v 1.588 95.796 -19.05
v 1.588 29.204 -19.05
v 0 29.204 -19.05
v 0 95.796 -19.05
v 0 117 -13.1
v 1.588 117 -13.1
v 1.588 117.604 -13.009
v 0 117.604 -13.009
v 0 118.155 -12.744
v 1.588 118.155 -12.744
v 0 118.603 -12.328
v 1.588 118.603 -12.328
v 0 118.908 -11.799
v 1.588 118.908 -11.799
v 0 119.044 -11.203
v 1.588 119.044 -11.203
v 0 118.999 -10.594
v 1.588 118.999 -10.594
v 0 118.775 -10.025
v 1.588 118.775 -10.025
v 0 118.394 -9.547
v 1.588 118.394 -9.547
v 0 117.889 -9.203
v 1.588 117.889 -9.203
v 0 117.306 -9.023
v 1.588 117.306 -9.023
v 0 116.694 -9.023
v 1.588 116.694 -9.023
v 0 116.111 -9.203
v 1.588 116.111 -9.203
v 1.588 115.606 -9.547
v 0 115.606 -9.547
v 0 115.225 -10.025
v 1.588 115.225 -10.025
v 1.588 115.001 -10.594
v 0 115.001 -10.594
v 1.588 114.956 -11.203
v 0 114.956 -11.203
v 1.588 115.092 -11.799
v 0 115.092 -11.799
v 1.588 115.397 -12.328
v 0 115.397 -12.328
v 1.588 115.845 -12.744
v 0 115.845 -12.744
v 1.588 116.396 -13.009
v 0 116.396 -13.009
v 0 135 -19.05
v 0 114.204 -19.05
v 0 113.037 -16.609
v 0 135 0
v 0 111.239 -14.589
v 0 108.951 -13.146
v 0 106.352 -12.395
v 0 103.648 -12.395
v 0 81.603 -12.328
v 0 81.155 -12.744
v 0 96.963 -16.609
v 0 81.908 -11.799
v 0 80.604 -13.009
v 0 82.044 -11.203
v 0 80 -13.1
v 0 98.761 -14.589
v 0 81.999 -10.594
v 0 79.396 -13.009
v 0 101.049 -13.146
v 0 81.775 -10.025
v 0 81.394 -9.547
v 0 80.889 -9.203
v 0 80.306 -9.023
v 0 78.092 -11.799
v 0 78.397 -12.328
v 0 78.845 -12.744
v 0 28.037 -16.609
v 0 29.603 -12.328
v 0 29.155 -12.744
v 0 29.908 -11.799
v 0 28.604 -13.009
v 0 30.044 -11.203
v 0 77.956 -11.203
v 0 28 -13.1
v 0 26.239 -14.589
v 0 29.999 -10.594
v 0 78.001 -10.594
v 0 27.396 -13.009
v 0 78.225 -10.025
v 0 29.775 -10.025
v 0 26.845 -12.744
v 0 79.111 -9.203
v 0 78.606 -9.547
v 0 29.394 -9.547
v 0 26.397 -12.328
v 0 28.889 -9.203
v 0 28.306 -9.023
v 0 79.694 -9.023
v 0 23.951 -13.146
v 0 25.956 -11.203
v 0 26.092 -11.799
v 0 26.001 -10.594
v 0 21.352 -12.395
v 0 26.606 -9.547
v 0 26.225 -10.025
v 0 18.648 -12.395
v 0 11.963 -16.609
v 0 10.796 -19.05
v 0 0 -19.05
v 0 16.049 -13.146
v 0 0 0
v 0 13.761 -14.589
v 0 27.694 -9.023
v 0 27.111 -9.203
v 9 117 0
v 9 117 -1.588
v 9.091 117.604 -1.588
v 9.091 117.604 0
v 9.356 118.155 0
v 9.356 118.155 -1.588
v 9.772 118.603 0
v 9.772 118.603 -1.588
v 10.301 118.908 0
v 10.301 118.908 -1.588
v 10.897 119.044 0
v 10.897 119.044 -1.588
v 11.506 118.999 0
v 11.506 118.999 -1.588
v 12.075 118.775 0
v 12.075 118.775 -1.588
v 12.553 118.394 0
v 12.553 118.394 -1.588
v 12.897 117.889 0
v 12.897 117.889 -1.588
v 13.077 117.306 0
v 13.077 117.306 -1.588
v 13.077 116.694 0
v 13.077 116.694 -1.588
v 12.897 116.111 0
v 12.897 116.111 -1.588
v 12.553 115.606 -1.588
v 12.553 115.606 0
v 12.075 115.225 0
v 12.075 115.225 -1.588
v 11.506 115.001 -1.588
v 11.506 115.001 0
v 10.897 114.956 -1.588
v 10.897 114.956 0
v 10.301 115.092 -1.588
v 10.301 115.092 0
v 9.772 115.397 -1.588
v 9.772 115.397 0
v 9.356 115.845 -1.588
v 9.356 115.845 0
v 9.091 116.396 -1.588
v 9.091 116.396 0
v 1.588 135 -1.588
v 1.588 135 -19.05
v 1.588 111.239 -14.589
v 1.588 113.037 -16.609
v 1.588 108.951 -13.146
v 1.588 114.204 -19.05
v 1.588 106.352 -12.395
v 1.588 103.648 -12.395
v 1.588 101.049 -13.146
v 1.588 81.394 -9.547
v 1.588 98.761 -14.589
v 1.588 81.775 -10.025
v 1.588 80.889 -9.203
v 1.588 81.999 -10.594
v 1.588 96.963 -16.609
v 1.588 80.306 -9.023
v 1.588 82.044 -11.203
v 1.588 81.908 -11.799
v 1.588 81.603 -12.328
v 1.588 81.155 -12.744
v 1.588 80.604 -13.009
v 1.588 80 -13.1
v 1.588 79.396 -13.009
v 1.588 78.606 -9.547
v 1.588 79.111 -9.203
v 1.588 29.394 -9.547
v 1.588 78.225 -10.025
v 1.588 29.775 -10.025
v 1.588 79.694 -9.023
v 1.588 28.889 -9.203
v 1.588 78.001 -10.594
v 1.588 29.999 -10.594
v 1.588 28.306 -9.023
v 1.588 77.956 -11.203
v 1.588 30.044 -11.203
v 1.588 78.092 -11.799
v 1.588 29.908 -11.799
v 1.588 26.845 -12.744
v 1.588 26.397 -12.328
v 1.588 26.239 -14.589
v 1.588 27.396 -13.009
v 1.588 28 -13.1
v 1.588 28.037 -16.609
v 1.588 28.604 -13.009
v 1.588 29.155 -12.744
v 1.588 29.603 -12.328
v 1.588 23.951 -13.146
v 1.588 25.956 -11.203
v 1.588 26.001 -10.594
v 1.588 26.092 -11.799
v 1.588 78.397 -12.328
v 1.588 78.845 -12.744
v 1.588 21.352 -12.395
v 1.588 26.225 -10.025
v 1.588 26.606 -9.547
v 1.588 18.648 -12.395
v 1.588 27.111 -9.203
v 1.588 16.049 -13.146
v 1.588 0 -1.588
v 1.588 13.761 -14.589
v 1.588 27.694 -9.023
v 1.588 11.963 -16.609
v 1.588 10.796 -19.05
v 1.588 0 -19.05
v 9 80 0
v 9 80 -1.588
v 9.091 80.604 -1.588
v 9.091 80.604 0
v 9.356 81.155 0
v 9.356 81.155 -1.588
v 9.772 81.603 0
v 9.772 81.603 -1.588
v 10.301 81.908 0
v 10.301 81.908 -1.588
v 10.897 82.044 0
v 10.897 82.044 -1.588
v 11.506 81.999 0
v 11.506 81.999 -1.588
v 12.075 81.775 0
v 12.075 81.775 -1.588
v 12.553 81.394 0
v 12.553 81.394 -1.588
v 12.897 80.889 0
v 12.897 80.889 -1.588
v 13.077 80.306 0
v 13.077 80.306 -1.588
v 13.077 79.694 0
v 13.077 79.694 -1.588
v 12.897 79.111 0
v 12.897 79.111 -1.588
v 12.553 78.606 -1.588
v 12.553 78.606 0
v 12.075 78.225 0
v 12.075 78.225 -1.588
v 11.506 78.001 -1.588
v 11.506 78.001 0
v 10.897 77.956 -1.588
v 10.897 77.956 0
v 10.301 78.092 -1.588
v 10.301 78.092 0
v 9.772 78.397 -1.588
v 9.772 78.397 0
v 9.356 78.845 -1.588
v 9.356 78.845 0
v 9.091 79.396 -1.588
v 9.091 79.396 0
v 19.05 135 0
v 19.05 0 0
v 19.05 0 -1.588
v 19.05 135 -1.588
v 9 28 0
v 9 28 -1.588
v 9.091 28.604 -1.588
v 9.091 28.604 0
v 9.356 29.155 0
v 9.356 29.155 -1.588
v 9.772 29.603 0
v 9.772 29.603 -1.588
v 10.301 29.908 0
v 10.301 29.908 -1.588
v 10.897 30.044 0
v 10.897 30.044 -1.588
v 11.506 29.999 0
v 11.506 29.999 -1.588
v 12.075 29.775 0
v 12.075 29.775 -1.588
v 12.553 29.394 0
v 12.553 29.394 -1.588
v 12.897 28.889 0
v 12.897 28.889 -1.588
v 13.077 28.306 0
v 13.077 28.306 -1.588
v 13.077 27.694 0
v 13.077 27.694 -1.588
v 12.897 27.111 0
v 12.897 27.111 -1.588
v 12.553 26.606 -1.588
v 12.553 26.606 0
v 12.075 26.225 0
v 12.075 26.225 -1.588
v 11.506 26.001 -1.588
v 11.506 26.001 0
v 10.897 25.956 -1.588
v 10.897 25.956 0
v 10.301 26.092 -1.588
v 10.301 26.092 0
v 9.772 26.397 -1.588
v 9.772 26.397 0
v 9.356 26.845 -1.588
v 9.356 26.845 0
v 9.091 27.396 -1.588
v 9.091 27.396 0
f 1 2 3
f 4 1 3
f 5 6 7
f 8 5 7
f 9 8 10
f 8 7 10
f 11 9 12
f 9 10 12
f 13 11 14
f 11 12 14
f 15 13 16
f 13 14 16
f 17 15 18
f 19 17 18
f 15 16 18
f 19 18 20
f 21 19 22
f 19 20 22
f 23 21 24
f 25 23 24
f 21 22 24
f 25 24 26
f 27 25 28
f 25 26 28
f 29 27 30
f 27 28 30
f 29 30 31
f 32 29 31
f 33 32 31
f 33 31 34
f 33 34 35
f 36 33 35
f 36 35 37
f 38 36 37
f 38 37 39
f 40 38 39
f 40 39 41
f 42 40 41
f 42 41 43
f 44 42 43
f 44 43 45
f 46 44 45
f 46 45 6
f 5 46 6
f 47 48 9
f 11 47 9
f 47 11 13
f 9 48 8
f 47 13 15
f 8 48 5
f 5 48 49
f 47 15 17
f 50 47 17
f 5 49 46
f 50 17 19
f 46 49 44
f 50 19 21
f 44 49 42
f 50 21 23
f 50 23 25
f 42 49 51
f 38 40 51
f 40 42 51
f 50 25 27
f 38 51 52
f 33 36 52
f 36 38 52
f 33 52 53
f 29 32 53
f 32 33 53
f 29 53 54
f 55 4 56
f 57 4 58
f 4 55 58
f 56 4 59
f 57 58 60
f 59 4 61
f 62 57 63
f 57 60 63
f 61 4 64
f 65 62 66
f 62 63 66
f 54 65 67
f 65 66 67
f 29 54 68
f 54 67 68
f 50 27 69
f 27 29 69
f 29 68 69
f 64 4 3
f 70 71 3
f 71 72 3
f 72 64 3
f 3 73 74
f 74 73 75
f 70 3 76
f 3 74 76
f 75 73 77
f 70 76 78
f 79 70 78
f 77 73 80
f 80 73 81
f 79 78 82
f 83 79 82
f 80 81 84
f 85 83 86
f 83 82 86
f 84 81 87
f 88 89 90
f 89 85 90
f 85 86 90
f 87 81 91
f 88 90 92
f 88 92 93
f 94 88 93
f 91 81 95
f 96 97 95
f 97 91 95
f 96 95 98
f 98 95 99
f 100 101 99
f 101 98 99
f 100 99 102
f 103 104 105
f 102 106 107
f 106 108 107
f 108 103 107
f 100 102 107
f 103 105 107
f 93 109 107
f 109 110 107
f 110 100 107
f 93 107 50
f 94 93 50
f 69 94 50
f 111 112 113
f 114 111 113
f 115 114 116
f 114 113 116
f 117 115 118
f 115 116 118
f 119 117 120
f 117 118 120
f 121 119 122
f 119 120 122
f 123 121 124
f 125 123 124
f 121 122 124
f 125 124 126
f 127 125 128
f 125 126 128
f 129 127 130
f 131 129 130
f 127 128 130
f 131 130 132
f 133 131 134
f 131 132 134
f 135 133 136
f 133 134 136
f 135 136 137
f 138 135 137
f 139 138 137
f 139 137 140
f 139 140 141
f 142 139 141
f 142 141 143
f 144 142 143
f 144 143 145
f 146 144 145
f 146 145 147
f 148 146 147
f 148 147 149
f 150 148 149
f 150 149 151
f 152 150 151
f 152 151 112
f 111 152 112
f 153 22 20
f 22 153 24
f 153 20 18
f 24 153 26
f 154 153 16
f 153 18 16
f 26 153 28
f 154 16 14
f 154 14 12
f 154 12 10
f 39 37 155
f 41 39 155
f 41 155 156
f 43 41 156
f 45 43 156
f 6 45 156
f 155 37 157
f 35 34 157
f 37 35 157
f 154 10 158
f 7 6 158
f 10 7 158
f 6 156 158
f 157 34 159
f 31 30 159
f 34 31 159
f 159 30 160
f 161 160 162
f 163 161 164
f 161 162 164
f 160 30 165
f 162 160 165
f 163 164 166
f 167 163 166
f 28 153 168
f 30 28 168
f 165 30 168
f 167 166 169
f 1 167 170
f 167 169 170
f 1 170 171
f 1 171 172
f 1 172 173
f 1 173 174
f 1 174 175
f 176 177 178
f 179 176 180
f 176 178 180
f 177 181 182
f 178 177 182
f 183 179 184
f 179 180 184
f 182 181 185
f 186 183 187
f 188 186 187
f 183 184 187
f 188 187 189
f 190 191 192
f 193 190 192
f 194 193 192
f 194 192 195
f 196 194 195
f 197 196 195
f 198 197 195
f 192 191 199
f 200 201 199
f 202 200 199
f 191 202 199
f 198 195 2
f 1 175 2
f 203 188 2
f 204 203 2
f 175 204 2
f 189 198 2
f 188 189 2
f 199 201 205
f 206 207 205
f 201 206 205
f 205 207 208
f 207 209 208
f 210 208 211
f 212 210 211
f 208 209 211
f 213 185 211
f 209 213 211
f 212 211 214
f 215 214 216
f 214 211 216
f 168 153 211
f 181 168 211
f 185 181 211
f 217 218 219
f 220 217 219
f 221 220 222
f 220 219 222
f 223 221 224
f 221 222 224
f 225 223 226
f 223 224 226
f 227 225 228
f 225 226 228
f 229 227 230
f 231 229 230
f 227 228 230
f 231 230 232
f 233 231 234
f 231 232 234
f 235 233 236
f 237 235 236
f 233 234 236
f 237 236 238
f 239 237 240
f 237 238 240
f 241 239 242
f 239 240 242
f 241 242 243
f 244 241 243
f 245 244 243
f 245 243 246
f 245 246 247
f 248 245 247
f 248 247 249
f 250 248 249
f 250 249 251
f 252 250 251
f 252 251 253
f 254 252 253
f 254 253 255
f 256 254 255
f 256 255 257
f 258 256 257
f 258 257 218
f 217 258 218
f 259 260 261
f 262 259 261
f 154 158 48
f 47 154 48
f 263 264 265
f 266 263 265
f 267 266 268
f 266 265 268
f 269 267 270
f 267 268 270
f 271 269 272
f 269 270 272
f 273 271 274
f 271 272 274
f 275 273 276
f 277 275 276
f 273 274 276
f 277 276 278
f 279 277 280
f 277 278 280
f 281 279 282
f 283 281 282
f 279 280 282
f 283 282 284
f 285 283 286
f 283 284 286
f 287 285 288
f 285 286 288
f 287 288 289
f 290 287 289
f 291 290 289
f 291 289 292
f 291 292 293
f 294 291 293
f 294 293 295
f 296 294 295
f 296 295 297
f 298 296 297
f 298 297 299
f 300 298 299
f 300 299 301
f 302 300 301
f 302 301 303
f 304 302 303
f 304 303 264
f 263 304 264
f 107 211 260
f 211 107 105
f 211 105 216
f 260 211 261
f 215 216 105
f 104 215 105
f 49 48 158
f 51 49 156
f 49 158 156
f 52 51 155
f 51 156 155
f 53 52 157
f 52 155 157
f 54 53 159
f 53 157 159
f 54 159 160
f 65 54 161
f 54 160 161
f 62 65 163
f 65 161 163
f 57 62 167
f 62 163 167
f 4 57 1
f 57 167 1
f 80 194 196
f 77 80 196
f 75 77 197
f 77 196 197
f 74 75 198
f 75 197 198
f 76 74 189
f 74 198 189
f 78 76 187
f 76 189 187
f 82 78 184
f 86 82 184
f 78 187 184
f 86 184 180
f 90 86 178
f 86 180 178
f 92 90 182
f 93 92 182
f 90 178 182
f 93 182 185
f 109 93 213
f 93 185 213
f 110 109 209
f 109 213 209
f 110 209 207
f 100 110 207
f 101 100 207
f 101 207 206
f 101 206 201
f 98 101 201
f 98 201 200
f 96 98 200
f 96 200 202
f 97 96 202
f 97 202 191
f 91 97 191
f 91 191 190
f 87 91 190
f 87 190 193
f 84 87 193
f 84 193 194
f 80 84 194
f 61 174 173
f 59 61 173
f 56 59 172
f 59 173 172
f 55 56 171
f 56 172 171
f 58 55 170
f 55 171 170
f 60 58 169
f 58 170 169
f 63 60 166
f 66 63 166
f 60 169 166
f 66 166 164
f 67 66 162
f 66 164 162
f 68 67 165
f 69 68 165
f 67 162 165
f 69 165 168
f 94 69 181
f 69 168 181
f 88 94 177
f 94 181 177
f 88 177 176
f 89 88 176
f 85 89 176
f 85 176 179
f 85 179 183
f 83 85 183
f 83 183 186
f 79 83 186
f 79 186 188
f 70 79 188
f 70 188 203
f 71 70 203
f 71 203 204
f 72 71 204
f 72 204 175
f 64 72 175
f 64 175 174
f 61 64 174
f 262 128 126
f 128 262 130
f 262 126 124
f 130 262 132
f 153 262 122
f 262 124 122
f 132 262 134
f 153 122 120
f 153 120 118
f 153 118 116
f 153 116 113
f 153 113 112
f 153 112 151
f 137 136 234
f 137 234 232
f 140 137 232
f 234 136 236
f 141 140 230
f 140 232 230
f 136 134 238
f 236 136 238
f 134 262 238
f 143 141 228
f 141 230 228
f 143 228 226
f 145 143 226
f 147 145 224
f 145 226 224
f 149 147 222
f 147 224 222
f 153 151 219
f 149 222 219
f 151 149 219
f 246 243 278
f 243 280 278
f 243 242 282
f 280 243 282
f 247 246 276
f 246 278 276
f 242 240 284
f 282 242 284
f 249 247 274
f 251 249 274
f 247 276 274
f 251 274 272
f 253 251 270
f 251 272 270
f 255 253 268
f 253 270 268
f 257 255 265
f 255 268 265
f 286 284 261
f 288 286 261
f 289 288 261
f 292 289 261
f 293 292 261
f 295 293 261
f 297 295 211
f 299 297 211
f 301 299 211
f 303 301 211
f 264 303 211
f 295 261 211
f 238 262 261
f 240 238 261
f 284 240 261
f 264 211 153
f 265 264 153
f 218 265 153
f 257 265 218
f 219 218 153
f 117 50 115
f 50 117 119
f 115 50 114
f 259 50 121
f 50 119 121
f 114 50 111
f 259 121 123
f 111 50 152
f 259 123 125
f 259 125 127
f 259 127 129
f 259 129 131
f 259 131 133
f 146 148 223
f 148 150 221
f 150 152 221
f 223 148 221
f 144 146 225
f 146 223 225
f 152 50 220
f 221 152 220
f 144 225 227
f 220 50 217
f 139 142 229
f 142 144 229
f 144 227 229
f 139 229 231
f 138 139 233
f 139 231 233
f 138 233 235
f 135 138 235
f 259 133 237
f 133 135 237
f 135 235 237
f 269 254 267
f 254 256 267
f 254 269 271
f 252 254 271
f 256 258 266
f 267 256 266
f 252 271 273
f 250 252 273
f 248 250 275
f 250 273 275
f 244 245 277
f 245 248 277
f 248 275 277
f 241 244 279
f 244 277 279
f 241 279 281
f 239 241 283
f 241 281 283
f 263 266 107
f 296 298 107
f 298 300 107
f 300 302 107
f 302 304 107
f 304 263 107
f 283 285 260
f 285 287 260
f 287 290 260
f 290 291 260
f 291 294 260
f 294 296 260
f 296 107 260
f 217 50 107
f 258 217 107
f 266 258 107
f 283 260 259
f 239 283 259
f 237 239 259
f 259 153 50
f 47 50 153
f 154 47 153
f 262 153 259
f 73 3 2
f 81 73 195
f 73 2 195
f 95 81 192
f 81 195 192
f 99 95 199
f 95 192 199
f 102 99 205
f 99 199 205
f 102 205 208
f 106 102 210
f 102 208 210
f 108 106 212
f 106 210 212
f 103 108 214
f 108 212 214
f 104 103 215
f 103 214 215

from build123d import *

# Parameters (mm, degrees)
BOSS_EXTRUDE1_DEPTH = 135
SKETCH2_R           = 2.05
CUT_EXTRUDE1_DEPTH  = 138.451232829
SKETCH3_R           = 2.05
CUT_EXTRUDE2_DEPTH  = 138.451232829
SKETCH6_R           = 9.65
CUT_EXTRUDE5_DEPTH  = 10


with BuildPart() as part:
    # Sketch1 → Boss-Extrude1 (new body)
    with BuildSketch(Plane(origin=(0, 0, 0), x_dir=(1, 0, 0), z_dir=(0, 1, 0))):
        Polygon((0, 0), (19.05, 0), (19.05, 1.5875), (1.5875, 1.5875), (1.5875, 19.05), (0, 19.05), align=None)
    extrude(amount=BOSS_EXTRUDE1_DEPTH)

    # Sketch2 → Cut-Extrude1 (cut, through all)
    with BuildSketch(Plane(origin=(1.5875, 0, 0), x_dir=(0, 0, -1), z_dir=(1, 0, 0))):
        with Locations((11.05, 117)):
            Circle(SKETCH2_R)
        with Locations((11.05, 80)):
            Circle(SKETCH2_R)
        with Locations((11.05, 28)):
            Circle(SKETCH2_R)
    extrude(amount=-CUT_EXTRUDE1_DEPTH, mode=Mode.SUBTRACT)

    # Sketch3 → Cut-Extrude2 (cut, through all)
    with BuildSketch(Plane(origin=(0, 0, -1.5875), x_dir=(-1, 0, 0), z_dir=(0, 0, -1))):
        with Locations((-11.05, 117)):
            Circle(SKETCH3_R)
        with Locations((-11.05, 80)):
            Circle(SKETCH3_R)
        with Locations((-11.05, 28)):
            Circle(SKETCH3_R)
    extrude(amount=-CUT_EXTRUDE2_DEPTH, mode=Mode.SUBTRACT)

    # Sketch6 → Cut-Extrude5 (cut)
    with BuildSketch(Plane(origin=(1.5875, 0, 0), x_dir=(0, 0, -1), z_dir=(1, 0, 0))):
        with Locations((21.95, 105)):
            Circle(SKETCH6_R)
        with Locations((21.95, 20)):
            Circle(SKETCH6_R)
    extrude(amount=-CUT_EXTRUDE5_DEPTH, mode=Mode.SUBTRACT)


solid = part.part
